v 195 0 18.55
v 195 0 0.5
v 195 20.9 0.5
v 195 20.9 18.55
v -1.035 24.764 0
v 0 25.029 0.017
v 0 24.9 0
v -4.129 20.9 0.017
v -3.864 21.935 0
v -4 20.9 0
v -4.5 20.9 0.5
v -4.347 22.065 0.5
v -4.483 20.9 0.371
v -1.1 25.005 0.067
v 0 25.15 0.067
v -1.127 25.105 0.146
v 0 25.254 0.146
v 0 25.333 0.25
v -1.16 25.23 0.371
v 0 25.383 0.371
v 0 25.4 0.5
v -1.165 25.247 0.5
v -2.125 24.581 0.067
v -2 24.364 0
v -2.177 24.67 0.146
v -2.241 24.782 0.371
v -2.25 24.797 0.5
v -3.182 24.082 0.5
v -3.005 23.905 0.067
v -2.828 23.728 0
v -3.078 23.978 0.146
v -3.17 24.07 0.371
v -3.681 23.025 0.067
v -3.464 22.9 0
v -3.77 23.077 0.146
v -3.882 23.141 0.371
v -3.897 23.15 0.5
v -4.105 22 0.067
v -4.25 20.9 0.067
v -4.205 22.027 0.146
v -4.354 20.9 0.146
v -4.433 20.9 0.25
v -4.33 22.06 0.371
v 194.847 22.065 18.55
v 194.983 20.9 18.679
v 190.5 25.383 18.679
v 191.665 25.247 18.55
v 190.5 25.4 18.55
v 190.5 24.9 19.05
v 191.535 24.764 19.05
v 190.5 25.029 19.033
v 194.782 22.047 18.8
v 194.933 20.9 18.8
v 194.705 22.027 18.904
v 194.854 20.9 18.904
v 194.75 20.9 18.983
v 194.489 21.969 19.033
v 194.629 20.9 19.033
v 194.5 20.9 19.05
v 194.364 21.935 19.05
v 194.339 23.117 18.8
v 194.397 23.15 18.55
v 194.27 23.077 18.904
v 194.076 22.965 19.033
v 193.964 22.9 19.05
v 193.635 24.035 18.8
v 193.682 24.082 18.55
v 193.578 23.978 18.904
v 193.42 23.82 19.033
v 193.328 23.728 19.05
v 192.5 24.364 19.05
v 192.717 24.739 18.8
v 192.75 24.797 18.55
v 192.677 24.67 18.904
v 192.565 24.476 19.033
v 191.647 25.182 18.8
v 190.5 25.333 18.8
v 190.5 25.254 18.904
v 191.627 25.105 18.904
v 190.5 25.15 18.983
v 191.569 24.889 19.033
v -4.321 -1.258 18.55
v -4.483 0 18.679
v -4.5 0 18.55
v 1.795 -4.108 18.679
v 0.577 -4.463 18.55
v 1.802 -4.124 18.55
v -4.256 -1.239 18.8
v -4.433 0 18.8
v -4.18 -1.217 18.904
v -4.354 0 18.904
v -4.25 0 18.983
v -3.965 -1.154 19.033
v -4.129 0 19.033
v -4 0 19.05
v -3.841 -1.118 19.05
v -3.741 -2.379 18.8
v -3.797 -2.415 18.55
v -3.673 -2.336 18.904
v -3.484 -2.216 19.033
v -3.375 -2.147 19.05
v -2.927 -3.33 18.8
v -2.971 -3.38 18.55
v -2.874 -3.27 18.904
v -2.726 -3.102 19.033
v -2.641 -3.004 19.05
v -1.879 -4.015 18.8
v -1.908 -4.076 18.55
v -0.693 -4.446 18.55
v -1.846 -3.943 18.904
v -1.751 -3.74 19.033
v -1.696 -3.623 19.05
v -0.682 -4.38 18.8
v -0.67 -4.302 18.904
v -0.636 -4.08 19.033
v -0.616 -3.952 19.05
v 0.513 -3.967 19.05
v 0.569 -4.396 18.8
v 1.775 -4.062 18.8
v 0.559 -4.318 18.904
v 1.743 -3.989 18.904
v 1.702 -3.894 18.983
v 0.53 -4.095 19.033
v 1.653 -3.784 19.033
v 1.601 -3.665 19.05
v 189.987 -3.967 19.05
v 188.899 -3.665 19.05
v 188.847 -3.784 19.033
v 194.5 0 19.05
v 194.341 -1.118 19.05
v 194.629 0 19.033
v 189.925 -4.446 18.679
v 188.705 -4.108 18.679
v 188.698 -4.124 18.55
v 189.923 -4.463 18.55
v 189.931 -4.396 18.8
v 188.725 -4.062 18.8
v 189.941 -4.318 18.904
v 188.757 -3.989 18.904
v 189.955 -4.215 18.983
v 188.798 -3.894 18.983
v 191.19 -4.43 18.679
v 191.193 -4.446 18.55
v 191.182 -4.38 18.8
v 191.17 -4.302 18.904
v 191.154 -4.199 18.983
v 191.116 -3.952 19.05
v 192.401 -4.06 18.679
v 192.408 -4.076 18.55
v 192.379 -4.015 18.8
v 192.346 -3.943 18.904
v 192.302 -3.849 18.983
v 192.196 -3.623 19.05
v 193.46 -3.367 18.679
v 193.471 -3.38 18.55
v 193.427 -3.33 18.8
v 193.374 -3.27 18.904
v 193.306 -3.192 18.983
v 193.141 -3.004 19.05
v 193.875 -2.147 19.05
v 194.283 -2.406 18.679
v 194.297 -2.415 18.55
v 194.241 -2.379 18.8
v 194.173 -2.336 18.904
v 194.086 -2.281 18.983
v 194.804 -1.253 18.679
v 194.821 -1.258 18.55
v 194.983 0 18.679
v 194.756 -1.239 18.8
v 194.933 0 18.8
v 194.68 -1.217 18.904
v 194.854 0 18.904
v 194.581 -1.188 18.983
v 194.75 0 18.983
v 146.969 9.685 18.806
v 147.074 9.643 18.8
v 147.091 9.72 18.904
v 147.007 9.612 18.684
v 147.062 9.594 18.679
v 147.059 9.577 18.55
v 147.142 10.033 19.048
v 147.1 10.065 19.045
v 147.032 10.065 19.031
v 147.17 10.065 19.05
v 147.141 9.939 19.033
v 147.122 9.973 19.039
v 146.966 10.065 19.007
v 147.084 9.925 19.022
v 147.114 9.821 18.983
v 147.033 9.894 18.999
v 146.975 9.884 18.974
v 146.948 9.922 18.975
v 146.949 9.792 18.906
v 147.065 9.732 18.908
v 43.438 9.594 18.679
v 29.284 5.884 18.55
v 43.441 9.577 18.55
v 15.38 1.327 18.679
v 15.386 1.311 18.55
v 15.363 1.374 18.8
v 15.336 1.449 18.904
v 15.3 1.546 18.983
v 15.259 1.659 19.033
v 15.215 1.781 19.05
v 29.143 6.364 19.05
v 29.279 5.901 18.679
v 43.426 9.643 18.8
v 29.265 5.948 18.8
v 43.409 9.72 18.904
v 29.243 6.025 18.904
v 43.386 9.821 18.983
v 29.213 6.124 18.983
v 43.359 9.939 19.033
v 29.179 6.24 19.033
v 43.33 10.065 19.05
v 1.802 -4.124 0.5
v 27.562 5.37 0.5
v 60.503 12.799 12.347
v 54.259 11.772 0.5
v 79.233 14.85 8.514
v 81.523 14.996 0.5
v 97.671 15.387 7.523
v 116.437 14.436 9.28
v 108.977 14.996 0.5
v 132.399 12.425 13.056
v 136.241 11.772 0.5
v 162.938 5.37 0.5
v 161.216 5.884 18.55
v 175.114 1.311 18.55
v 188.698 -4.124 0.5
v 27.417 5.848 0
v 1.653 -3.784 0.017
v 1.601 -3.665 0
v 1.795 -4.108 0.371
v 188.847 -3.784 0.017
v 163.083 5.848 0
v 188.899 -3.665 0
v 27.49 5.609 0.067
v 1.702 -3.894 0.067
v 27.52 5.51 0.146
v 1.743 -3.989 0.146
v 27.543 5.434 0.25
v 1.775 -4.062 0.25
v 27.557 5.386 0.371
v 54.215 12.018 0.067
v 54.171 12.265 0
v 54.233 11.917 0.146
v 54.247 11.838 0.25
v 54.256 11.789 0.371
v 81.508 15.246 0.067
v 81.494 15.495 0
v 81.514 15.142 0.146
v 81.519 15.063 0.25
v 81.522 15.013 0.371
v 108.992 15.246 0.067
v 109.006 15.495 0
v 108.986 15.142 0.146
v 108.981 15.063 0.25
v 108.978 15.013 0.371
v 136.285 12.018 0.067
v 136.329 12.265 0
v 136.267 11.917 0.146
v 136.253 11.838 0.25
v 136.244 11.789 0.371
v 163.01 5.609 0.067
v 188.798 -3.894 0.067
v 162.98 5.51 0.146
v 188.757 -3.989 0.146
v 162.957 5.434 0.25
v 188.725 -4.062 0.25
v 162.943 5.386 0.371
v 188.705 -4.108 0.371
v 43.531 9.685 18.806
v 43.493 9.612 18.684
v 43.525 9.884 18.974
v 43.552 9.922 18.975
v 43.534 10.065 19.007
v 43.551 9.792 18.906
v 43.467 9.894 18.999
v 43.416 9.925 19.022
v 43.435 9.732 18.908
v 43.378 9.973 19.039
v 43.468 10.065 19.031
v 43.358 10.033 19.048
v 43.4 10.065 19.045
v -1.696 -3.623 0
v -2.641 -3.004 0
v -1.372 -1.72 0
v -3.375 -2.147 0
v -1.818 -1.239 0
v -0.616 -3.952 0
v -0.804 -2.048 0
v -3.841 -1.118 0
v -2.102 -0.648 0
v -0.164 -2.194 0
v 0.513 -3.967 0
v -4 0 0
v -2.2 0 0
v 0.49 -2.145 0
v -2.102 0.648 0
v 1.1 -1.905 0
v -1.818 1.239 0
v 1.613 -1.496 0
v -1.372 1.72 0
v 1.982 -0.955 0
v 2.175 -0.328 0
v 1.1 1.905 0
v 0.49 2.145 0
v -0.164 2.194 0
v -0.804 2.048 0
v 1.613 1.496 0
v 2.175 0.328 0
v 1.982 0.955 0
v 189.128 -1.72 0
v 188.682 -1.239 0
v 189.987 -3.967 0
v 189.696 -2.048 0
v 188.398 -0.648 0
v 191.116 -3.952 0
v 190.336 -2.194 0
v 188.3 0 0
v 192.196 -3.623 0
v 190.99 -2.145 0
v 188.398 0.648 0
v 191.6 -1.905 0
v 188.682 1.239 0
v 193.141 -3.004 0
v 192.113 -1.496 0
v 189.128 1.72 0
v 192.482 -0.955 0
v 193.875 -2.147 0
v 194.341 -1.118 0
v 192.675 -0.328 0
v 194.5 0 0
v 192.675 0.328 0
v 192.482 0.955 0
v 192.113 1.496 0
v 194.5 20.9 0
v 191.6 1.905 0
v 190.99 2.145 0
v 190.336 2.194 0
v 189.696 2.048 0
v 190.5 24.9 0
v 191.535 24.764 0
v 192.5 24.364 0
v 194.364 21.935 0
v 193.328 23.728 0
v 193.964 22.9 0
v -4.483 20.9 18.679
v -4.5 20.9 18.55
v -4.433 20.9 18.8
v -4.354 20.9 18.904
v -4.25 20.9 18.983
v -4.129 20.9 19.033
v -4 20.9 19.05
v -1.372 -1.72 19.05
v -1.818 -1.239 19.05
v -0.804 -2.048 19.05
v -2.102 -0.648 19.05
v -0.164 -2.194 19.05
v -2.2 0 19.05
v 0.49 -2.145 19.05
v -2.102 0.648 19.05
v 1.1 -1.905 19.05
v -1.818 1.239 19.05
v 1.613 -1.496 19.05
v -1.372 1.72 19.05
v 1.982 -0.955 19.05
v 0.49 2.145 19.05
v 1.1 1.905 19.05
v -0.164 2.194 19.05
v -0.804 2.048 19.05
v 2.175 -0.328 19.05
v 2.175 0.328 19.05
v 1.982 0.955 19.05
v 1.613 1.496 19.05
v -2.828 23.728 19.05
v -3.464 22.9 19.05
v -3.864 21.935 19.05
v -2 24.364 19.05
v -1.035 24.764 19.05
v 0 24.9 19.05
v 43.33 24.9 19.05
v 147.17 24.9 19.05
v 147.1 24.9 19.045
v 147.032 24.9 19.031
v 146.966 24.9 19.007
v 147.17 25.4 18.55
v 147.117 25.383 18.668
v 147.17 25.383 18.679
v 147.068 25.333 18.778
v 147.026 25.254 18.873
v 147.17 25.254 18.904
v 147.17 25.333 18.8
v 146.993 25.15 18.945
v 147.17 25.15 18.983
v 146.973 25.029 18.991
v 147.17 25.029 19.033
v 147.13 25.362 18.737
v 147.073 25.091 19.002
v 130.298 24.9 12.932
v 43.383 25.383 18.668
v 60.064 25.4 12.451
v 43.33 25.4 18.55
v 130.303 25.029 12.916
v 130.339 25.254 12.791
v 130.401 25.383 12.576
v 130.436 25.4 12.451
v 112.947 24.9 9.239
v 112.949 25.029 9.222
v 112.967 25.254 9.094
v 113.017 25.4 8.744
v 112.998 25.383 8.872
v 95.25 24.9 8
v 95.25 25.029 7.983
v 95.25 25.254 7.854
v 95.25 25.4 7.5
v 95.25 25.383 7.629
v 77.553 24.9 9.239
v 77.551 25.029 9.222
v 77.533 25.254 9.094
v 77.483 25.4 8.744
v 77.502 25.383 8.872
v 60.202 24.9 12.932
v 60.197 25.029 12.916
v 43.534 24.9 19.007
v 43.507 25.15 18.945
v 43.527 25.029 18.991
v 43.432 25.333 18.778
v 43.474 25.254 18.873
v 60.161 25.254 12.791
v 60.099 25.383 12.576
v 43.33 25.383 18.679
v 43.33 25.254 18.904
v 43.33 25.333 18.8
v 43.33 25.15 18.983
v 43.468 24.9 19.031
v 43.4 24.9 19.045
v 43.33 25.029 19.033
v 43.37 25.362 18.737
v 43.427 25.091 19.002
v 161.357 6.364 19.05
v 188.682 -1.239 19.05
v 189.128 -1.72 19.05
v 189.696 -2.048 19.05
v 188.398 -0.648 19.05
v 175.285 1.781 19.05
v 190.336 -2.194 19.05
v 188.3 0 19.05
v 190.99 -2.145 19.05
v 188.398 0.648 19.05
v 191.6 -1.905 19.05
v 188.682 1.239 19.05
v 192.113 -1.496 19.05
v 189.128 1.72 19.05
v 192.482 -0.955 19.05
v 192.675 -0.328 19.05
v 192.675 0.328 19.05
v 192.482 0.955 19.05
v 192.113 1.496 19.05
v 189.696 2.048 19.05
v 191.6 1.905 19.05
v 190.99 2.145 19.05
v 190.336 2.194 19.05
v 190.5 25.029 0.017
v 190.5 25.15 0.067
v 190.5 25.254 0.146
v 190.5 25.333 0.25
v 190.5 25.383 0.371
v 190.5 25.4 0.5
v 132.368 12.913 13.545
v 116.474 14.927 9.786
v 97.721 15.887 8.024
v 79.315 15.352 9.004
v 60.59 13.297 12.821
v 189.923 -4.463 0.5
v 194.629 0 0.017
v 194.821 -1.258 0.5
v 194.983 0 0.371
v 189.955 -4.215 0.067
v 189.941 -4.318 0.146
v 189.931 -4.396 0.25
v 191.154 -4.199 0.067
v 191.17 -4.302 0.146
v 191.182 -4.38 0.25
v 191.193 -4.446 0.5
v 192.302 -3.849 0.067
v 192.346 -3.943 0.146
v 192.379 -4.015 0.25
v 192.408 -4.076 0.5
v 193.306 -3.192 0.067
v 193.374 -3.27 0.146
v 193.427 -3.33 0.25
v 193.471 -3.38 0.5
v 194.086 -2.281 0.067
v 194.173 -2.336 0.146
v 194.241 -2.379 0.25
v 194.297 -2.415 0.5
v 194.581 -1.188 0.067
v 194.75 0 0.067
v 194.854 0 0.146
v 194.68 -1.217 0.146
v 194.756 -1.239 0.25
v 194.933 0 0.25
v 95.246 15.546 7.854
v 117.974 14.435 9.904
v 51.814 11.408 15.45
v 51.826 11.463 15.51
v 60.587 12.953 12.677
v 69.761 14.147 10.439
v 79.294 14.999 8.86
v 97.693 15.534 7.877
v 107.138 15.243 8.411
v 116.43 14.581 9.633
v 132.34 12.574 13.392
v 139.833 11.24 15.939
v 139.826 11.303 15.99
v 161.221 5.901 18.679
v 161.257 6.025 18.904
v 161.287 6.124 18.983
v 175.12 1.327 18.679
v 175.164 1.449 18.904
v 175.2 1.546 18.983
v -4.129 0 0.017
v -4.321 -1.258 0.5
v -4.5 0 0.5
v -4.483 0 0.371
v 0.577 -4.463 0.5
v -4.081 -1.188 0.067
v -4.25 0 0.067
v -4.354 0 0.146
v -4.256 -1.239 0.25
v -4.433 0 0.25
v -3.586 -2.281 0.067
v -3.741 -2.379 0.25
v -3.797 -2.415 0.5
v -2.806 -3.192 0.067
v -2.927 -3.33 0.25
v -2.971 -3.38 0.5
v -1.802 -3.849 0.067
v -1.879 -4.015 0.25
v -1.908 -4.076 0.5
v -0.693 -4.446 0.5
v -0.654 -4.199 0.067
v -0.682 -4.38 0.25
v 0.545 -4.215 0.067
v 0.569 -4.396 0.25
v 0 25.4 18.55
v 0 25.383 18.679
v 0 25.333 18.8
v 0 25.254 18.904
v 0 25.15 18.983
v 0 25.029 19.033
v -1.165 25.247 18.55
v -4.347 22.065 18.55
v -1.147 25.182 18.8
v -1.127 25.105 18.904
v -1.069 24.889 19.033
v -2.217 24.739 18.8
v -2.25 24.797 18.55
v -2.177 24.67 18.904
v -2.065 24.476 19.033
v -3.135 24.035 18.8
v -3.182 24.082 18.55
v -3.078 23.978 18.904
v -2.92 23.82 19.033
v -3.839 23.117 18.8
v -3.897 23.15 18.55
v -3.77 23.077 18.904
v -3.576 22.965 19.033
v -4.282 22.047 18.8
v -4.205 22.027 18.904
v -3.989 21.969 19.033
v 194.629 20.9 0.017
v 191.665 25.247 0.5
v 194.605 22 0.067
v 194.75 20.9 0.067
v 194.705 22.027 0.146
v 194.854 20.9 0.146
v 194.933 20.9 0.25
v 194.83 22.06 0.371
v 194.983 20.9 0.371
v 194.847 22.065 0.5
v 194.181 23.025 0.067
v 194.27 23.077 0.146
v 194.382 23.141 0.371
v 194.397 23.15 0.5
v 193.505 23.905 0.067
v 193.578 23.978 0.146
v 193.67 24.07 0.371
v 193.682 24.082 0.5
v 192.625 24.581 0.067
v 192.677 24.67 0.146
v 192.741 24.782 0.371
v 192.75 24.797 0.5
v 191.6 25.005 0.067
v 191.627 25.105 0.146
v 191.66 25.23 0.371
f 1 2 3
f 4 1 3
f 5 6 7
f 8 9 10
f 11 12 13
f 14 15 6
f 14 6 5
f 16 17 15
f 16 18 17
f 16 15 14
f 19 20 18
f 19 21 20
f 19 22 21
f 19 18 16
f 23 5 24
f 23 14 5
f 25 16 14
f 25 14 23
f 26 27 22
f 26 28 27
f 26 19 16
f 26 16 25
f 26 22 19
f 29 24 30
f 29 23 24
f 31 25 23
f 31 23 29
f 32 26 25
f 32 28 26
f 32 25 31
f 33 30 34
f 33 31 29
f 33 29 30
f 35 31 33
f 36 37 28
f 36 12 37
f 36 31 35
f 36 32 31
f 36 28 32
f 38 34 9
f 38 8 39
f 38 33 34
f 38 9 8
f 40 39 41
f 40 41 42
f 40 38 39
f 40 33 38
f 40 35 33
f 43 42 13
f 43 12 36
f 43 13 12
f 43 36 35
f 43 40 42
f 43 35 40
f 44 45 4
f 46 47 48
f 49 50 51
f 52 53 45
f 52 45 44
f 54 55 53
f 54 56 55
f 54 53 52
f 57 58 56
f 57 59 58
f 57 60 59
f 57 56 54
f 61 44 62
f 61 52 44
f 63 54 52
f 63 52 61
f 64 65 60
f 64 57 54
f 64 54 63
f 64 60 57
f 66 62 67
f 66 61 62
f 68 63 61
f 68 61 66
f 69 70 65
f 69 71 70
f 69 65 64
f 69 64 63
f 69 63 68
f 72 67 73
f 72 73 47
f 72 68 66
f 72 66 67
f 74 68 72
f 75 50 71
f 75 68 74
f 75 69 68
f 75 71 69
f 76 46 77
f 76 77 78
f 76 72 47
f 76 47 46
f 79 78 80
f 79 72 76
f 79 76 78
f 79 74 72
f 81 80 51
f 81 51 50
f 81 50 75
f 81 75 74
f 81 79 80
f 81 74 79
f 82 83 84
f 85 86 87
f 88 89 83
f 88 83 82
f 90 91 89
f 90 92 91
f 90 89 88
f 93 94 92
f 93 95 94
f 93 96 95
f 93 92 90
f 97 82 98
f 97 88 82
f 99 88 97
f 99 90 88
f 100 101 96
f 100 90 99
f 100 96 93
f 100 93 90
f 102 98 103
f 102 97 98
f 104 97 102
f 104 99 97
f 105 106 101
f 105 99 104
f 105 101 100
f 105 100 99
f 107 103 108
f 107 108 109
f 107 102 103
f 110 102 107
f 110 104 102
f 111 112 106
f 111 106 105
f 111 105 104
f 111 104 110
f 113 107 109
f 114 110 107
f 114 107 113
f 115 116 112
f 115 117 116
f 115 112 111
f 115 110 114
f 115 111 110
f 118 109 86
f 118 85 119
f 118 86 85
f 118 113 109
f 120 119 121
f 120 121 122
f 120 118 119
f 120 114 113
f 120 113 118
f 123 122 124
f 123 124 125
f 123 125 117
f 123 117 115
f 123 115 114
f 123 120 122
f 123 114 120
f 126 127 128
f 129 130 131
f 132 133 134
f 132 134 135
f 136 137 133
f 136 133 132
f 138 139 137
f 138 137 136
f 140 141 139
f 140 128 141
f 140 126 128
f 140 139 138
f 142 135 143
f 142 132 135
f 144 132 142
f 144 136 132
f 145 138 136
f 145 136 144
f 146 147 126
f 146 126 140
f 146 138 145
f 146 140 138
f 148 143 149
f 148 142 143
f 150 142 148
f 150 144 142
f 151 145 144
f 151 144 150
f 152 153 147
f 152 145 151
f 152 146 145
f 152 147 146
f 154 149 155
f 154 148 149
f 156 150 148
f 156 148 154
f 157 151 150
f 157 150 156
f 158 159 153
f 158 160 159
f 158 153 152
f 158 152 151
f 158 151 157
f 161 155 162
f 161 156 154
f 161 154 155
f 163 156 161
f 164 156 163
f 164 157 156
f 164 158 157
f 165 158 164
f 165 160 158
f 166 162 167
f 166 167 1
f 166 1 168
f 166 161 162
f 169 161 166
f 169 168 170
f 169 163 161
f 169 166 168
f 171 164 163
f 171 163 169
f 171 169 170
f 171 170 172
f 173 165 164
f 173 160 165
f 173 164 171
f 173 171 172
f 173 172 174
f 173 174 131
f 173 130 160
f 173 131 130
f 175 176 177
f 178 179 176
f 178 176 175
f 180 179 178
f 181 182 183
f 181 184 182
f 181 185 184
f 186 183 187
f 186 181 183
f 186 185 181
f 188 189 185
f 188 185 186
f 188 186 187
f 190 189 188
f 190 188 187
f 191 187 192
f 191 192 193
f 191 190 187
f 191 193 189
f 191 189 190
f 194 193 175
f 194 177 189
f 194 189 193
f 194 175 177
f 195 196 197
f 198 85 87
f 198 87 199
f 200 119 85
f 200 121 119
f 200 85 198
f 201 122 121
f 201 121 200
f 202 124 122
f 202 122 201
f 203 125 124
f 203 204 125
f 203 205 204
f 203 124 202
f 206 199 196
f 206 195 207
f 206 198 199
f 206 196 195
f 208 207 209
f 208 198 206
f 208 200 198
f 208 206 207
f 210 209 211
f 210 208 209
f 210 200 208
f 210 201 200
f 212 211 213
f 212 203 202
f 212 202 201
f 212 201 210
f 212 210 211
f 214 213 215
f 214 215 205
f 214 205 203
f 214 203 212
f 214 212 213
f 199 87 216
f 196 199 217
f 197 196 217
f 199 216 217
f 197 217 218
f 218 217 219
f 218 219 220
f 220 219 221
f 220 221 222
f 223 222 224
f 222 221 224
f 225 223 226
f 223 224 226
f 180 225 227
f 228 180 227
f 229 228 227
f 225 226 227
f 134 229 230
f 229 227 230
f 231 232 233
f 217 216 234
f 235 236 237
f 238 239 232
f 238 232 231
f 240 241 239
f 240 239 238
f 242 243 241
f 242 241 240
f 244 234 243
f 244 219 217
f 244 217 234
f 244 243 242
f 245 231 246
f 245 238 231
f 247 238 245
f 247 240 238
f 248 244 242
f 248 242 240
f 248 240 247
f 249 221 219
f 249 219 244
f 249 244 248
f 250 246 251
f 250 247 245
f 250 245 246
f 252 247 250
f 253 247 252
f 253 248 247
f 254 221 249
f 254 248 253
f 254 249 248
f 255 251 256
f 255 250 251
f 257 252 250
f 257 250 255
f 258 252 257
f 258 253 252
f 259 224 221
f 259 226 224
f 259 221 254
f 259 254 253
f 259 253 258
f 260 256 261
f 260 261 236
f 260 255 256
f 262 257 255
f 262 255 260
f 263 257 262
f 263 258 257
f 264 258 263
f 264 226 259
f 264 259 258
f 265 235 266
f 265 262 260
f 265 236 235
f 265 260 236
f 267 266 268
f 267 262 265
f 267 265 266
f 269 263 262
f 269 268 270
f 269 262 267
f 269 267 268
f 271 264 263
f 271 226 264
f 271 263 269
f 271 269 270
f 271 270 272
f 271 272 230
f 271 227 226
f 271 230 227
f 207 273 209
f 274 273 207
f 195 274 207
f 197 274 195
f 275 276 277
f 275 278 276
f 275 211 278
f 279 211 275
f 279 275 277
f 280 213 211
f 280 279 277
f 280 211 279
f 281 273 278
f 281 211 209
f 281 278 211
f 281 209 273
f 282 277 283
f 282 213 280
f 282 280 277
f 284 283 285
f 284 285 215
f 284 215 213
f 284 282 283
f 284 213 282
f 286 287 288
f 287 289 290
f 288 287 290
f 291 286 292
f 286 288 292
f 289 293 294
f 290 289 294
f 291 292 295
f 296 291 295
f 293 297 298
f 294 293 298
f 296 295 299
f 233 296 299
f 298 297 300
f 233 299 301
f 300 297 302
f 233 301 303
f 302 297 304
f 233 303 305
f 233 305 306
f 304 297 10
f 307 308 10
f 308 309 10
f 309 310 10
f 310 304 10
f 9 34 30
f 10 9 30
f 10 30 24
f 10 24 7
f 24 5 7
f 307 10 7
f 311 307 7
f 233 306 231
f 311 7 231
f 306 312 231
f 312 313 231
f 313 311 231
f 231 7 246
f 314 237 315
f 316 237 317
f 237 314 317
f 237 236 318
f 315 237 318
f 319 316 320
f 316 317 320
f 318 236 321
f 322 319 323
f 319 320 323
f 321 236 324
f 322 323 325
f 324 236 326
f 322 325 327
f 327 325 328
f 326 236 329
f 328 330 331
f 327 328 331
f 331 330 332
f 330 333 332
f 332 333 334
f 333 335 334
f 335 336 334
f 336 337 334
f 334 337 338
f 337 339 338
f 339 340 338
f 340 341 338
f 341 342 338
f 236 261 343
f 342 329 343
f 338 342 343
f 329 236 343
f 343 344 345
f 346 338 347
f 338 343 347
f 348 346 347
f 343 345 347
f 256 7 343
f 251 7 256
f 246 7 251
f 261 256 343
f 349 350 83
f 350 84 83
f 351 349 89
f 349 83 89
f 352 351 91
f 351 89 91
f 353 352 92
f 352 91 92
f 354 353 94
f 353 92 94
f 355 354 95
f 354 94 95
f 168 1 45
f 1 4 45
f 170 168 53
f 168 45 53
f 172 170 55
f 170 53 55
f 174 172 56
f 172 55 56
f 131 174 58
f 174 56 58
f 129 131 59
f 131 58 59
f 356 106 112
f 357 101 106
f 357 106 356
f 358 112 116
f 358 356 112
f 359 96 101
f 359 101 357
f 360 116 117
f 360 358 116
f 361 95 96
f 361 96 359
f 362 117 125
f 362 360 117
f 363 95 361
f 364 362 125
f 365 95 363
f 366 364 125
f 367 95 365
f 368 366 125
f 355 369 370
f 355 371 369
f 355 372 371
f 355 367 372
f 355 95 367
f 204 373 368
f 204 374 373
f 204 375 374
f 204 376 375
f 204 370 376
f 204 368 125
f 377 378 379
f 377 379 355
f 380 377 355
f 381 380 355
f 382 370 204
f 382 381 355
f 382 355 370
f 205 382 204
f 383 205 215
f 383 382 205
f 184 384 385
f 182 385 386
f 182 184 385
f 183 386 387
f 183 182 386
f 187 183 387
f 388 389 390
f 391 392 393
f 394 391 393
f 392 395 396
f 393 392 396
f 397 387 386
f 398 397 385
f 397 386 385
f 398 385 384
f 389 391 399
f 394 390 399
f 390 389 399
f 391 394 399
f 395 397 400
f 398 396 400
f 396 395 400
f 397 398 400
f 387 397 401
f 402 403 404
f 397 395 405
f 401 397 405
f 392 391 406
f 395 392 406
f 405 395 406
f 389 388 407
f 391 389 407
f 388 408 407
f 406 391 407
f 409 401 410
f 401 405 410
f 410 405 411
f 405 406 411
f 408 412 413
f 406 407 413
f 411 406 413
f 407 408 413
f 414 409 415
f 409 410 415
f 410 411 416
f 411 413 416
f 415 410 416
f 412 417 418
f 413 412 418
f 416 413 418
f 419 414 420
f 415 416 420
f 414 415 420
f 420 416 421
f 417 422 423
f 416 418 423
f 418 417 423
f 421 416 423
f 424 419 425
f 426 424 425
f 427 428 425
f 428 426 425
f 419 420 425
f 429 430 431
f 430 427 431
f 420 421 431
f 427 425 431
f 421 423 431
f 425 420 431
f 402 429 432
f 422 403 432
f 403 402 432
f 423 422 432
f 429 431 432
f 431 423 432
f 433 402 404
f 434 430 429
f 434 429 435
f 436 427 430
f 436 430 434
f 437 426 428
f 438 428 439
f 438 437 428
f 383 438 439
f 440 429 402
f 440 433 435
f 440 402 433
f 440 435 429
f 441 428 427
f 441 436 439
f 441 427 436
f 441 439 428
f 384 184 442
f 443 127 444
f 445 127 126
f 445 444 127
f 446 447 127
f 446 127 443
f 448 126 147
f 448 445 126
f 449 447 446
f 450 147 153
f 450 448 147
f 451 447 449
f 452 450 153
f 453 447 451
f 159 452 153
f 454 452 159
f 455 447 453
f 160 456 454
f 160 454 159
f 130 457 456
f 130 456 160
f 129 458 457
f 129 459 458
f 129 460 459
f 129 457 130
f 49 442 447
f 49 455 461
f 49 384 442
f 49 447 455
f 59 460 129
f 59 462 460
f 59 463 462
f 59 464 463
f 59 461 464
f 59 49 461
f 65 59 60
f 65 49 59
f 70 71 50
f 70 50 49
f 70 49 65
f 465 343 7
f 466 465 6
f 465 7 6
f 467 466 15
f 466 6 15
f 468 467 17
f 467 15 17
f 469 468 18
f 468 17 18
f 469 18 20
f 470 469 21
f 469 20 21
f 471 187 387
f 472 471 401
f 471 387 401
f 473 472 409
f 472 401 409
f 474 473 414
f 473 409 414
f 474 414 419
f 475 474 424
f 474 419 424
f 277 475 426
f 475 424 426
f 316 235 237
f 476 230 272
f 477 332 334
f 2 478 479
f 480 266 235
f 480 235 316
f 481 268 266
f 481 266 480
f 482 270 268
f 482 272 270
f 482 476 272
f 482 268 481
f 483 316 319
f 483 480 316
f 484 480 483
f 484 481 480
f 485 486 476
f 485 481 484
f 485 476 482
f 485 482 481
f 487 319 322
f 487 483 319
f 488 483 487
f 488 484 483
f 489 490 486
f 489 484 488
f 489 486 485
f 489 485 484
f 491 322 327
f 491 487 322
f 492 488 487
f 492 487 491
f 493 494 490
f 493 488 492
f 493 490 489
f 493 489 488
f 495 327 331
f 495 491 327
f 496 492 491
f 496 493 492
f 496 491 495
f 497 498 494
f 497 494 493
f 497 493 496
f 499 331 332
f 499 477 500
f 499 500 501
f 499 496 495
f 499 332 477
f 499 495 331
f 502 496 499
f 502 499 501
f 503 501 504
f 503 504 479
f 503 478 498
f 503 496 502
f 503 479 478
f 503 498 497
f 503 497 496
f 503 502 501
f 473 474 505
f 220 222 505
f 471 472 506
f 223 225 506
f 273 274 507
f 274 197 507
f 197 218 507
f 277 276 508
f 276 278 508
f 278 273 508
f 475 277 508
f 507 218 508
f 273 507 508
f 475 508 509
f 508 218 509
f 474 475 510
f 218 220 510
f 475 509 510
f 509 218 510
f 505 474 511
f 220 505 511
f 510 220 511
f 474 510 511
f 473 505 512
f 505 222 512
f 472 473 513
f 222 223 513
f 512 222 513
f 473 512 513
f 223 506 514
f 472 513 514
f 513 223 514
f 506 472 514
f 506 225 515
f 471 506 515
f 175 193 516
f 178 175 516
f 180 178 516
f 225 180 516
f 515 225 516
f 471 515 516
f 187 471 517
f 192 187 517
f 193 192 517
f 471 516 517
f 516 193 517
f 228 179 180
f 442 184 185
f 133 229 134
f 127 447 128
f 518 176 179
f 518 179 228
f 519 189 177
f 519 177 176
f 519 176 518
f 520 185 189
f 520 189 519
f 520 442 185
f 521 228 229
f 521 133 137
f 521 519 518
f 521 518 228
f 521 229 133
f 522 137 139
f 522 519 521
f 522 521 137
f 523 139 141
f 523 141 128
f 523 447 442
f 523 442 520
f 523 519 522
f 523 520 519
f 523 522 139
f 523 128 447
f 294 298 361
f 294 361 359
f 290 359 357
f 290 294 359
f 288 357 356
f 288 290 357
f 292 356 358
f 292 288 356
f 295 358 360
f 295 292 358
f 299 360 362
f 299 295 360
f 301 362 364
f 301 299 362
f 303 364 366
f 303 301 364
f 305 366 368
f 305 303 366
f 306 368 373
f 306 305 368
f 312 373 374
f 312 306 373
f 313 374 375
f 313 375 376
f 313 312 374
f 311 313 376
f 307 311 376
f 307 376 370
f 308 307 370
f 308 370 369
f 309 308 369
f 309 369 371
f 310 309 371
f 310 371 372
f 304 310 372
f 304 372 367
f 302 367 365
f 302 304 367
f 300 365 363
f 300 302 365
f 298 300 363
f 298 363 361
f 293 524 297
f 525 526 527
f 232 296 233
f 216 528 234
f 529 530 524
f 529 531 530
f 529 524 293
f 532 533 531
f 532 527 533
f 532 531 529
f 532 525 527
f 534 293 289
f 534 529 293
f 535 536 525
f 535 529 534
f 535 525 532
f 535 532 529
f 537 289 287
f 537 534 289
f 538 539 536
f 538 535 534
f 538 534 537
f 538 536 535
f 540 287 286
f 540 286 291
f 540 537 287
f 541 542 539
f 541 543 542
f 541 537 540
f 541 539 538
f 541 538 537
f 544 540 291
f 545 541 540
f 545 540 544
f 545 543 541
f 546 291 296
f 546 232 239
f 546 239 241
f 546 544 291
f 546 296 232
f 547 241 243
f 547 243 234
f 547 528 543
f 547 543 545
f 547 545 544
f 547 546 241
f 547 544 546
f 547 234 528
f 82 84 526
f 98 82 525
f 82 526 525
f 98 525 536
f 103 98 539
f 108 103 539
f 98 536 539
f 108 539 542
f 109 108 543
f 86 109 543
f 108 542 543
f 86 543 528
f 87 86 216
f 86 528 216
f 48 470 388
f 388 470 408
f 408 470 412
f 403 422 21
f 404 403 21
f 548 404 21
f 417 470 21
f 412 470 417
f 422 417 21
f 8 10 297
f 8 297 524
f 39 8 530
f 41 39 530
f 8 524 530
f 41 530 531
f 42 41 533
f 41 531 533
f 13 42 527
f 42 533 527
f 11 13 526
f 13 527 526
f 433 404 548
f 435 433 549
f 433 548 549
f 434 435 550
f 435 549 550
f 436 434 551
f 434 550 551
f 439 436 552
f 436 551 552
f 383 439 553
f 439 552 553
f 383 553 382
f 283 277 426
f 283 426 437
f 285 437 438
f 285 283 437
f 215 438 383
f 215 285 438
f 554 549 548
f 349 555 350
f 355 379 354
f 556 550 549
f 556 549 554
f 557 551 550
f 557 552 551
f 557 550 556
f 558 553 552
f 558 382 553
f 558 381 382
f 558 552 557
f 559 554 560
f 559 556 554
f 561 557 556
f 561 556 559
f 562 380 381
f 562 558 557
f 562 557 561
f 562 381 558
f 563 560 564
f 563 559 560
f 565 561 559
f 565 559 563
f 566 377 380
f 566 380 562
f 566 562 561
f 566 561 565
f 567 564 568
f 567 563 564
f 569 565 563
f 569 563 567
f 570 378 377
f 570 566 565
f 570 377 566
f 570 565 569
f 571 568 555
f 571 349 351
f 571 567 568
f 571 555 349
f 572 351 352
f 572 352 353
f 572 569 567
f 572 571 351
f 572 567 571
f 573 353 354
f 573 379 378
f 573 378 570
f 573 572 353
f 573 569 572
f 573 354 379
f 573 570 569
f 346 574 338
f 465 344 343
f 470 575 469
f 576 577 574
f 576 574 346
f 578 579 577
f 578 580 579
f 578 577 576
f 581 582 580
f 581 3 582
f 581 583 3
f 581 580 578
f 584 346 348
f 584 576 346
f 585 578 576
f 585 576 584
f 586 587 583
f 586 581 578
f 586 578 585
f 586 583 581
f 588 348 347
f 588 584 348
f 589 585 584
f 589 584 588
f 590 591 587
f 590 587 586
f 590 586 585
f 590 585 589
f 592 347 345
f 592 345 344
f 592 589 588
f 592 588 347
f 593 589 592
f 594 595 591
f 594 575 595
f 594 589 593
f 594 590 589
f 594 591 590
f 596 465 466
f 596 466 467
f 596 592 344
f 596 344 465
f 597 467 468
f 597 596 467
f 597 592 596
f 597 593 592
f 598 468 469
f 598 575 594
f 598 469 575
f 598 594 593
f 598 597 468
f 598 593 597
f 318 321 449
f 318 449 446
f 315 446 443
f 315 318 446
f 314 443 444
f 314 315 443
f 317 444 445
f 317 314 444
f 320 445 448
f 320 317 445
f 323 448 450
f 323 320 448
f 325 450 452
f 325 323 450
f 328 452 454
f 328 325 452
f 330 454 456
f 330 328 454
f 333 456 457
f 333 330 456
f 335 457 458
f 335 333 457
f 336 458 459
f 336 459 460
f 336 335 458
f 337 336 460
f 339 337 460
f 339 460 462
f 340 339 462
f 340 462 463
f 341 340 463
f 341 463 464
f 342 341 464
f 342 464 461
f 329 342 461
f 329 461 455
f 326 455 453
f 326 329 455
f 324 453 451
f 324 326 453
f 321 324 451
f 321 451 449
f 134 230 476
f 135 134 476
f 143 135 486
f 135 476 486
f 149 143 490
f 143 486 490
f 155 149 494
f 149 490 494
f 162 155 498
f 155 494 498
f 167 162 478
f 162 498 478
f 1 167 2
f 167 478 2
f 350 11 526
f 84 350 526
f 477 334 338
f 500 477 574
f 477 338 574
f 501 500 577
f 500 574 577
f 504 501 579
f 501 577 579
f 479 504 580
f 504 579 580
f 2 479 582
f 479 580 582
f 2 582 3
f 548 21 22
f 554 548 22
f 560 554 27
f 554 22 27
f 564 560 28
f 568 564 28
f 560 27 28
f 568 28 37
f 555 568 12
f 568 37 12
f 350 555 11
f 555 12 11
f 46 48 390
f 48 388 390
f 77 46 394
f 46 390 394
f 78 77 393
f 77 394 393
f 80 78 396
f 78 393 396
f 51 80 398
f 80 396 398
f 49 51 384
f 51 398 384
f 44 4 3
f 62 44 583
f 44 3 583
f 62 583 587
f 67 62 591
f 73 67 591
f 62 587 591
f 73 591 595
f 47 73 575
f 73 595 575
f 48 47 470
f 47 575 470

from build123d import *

# Parameters (mm, degrees)
SKETCH1_R               = 4.5
SKETCH1_R_2             = 2.2
BOSS_EXTRUDE1_DEPTH     = 19.05
CUT_EXTRUDE1_REACH      = 200.197
CUT_EXTRUDE1_END_RADIUS = 233.403831658
FILLET1_R               = 0.5


with BuildPart() as part:
    # Sketch1 → Boss-Extrude1 (new body)
    # profile 1 of 5: a face of its own
    with BuildSketch(Plane.XY):
        with BuildLine():
            Line((190.5, 25.4), (0, 25.4))
            ThreePointArc((0, 25.4), (3.181980515, 24.081980515), (4.5, 20.9))
            ThreePointArc((4.5, 20.9), (0, 16.4), (-4.5, 20.9))
            Line((-4.5, 20.9), (-4.5, 0))
            ThreePointArc((-4.5, 0), (0, 4.5), (4.5, 0))
            ThreePointArc((4.5, 0), (3.765470156, -2.463987521), (1.801673554, -4.123587322))
            ThreePointArc((1.801673554, -4.123587322), (95.249999978, 15.4), (188.698326405, -4.123587304))
            ThreePointArc((188.698326405, -4.123587304), (188.036012498, 3.765470168), (195, 0))
            Line((195, 0), (195, 20.9))
            ThreePointArc((195, 20.9), (187.318019485, 17.718019485), (190.5, 25.4))
        make_face()
    # profile 2 of 5: a face of its own
    with BuildSketch(Plane.XY):
        Circle(SKETCH1_R)
        with Locations(Location((0, 0, 0), (0, 0, 180))):
            Circle(SKETCH1_R_2, mode=Mode.SUBTRACT)
    # profile 3 of 5: a face of its own
    with BuildSketch(Plane.XY):
        with Locations((0, 20.9)):
            Circle(SKETCH1_R)
    # profile 4 of 5: a face of its own
    with BuildSketch(Plane.XY):
        with Locations((190.5, 20.9)):
            Circle(SKETCH1_R)
    # profile 5 of 5: a face of its own
    with BuildSketch(Plane.XY):
        with Locations((190.5, 0)):
            Circle(SKETCH1_R)
        with Locations(Location((190.5, 0, 0), (0, 0, 180))):
            Circle(SKETCH1_R_2, mode=Mode.SUBTRACT)
    extrude(amount=BOSS_EXTRUDE1_DEPTH)

    # Cut-Extrude1: up to this cylinder (the profile starts outside it)
    cut_extrude1_end = Plane(origin=(95.25, -218.003831658, 75.735711), z_dir=(0, 0, -1)) * Cylinder(CUT_EXTRUDE1_END_RADIUS, 990.446901317, mode=Mode.PRIVATE)
    # Sketch2 → Cut-Extrude1 (cut, up to the surface)
    with BuildSketch(Plane(origin=(0, 25.4, 0), x_dir=(1, 0, 0), z_dir=(0, 1, 0)), mode=Mode.PRIVATE) as cut_extrude1_sk1:
        with BuildLine():
            ThreePointArc((43.436898375, -19.05), (26.153197999, -241.558115379), (222.25, -135))
            ThreePointArc((222.25, -135), (201.808115379, -65.903197999), (147.063101625, -19.05))
            Line((147.063101625, -19.05), (43.436898375, -19.05))
        make_face()
    cut_extrude1_tool1 = extrude(cut_extrude1_sk1.sketch, amount=-CUT_EXTRUDE1_REACH, mode=Mode.PRIVATE) - cut_extrude1_end
    add(cut_extrude1_tool1.solids().sort_by_distance((95.25, 25.4, 136.85833))[0], mode=Mode.SUBTRACT)
    # Sketch2 → Cut-Extrude1 (cut, up to the surface)
    with BuildSketch(Plane(origin=(0, 25.4, 0), x_dir=(1, 0, 0), z_dir=(0, 1, 0)), mode=Mode.PRIVATE) as cut_extrude1_sk2:
        with BuildLine():
            Line((43.436898375, -19.05), (147.063101625, -19.05))
            ThreePointArc((147.063101625, -19.05), (95.25, -8), (43.436898375, -19.05))
        make_face()
    cut_extrude1_tool2 = extrude(cut_extrude1_sk2.sketch, amount=-CUT_EXTRUDE1_REACH, mode=Mode.PRIVATE) - cut_extrude1_end
    add(cut_extrude1_tool2.solids().sort_by_distance((95.25, 25.4, 14.613092))[0], mode=Mode.SUBTRACT)

    # Fillet1
    fillet1_edges = [part.edges().sort_by_distance(p)[0] for p in [
        (192.963987502, -3.765470168, 19.05),
        (-2.463987521, -3.765470156, 0),
        (-4.5, 10.45, 0),
        (-3.181980515, 24.081980515, 0),
        (95.25, 25.4, 0),
        (193.681980515, 24.081980515, 0),
        (195, 10.45, 0),
        (192.963987502, -3.765470168, 0),
        (95.249999978, 15.4, 0),
        (195, 10.45, 19.05),
        (193.681980515, 24.081980515, 19.05),
        (21.718449188, 25.4, 19.05),
        (-3.181980515, 24.081980515, 19.05),
        (22.29698174, 3.70590146, 19.05),
        (168.781550812, 25.4, 19.05),
        (-4.5, 10.45, 19.05),
        (147.063101625, 17.488188236, 19.05),
        (95.25, 15.4, 8),
        (43.436898375, 17.488188236, 19.05),
        (95.25, 25.4, 8),
        (-2.463987521, -3.765470156, 19.05),
        (168.203018239, 3.705901467, 19.05),
    ]]
    fillet(fillet1_edges, radius=FILLET1_R)


solid = part.part
